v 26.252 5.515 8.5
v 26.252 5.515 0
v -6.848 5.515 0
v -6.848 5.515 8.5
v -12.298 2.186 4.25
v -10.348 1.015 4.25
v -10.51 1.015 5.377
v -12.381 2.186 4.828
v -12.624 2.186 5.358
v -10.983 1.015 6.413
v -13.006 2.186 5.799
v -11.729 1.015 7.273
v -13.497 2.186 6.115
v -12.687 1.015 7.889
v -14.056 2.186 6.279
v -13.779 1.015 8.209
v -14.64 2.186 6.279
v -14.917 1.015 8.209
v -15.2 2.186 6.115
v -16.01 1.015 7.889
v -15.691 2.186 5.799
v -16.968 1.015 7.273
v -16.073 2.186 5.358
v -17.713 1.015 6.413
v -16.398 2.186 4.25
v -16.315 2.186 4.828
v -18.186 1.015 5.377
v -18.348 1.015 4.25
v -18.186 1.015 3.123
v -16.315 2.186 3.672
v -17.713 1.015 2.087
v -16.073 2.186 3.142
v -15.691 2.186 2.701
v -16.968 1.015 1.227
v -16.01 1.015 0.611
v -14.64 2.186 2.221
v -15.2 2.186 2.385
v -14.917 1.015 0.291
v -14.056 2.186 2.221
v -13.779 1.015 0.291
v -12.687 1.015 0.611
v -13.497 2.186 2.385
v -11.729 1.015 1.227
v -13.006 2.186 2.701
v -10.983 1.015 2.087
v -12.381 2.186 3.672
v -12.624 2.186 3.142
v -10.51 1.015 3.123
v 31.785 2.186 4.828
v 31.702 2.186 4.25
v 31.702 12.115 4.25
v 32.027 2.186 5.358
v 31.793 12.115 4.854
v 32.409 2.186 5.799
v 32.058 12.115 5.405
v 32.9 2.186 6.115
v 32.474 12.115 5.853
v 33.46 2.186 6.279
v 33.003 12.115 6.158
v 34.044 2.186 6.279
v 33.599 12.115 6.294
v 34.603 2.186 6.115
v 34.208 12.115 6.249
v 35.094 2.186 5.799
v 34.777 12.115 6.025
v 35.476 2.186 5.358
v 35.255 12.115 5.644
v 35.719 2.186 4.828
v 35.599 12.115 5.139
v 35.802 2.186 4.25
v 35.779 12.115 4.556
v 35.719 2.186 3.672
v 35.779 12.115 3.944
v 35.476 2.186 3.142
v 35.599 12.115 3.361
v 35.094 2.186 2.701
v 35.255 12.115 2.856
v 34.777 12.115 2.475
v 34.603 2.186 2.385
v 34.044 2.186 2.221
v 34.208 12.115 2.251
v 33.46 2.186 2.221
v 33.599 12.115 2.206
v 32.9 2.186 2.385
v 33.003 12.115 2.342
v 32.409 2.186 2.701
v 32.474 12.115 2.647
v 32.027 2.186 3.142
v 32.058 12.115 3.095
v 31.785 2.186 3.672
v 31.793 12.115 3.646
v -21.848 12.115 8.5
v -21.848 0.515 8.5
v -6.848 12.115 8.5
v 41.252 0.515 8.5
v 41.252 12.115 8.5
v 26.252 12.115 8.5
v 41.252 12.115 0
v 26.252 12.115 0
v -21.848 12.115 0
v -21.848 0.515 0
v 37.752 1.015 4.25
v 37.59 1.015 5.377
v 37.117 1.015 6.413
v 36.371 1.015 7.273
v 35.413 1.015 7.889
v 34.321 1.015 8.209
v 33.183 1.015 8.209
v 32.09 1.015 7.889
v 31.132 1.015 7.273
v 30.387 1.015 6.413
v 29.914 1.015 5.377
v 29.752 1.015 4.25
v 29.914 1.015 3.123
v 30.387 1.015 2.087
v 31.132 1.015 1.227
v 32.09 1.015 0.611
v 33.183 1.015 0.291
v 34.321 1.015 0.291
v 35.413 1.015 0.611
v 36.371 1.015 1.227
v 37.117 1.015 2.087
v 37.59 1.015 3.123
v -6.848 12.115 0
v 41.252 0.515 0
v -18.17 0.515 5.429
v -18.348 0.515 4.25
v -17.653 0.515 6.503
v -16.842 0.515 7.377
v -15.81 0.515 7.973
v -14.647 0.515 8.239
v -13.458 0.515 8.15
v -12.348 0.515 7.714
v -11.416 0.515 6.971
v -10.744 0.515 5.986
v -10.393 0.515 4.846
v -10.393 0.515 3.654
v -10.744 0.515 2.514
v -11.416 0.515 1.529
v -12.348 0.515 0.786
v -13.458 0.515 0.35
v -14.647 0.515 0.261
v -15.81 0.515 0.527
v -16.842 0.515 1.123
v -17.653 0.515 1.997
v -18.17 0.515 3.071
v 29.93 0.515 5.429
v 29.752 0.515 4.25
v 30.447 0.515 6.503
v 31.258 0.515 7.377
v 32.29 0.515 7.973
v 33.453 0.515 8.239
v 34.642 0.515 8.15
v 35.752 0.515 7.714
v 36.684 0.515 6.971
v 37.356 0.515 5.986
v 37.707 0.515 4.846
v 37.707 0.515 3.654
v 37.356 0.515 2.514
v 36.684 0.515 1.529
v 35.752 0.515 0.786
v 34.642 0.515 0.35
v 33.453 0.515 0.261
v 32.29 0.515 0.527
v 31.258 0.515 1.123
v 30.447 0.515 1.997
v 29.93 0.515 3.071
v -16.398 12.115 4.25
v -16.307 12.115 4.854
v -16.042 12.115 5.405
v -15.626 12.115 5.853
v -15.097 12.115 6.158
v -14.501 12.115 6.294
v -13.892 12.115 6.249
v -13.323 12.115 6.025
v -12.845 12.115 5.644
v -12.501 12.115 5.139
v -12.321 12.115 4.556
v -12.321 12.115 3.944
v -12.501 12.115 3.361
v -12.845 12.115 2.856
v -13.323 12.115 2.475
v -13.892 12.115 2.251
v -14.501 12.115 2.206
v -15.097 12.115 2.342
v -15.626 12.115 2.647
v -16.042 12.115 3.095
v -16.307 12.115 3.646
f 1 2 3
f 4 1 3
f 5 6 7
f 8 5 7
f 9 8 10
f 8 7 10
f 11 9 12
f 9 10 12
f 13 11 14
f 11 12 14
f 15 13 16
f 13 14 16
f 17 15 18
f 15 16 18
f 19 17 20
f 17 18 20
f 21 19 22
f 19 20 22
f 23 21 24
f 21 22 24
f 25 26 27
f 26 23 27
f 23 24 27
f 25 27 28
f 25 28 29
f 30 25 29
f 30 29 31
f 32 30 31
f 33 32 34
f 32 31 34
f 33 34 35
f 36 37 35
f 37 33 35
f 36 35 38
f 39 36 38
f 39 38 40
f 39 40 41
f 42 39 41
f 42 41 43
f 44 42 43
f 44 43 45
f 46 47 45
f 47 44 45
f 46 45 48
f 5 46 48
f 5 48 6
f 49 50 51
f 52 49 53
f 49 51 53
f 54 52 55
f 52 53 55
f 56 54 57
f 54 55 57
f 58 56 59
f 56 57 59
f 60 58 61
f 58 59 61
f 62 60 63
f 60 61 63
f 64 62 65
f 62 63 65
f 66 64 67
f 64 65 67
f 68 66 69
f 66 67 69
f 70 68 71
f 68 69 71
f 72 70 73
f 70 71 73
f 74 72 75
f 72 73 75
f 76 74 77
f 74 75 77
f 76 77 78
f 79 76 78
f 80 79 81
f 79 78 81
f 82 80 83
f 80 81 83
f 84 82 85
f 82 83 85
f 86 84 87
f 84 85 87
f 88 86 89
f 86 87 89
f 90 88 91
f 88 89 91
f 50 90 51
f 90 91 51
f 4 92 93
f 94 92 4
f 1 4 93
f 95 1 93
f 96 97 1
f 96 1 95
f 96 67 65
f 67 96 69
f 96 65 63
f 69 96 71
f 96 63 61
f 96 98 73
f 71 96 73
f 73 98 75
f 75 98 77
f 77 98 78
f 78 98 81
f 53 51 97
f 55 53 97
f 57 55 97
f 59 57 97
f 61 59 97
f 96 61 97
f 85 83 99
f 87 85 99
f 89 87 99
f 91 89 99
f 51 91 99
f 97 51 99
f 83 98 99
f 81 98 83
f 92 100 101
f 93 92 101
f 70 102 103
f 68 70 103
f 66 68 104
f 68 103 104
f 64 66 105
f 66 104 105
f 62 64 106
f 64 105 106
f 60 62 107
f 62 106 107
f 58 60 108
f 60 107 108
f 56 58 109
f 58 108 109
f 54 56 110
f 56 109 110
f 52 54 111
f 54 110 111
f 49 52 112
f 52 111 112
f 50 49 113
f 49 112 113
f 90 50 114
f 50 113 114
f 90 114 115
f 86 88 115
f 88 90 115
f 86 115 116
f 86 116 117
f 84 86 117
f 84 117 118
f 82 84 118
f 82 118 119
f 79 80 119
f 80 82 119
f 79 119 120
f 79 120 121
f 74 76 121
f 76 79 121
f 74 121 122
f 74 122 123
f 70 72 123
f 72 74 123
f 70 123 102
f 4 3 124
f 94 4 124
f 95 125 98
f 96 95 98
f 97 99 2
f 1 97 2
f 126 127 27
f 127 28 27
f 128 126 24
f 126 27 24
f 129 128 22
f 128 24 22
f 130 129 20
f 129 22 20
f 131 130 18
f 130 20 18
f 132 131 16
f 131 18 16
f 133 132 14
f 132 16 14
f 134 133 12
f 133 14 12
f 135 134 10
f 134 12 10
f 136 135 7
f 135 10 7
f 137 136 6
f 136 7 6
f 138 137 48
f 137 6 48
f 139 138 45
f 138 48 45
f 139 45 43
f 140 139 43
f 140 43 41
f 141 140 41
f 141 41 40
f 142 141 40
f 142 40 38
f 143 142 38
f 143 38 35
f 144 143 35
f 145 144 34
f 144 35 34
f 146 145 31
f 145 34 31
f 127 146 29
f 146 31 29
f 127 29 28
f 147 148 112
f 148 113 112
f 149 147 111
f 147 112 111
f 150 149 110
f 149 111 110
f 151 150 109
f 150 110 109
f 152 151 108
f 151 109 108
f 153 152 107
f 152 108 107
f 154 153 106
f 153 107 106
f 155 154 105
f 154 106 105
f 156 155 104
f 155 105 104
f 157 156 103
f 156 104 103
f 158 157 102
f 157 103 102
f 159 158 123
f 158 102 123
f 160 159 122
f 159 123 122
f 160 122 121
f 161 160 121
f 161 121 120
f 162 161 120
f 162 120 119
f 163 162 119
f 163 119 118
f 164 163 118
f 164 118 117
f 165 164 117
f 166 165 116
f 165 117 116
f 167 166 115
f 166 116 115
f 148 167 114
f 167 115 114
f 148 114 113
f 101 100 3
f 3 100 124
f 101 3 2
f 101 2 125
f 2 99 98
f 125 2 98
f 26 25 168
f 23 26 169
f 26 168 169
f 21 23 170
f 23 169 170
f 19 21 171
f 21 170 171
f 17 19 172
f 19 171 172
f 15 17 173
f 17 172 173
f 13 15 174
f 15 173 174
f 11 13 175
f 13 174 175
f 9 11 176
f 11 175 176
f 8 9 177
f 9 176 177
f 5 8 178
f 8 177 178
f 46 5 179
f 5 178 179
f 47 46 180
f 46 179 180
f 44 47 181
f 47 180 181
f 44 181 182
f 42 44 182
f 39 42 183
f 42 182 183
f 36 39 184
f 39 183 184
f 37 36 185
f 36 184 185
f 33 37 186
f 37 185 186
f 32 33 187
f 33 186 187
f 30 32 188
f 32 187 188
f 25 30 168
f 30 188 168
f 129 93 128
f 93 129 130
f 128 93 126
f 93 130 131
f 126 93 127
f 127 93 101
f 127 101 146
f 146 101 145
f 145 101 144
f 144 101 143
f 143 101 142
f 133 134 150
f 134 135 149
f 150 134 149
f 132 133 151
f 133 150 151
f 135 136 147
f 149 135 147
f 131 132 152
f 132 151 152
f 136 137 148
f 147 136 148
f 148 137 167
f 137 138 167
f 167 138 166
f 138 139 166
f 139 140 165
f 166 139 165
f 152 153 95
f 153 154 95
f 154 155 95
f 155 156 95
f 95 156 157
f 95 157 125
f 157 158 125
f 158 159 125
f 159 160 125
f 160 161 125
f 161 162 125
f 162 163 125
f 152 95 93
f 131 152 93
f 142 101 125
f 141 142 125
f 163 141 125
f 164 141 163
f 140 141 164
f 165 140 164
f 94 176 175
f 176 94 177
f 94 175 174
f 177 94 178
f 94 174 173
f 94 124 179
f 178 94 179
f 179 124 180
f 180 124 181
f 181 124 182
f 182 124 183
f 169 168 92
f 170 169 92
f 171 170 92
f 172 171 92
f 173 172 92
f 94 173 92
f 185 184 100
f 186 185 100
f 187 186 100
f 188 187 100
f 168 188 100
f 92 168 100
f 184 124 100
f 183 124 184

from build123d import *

# Parameters (mm, degrees)
F1_DEPTH = 8.5
F3_D     = 4.1
F3_DEPTH = 12
F3_TIP   = 1.231764269
F4_D     = 8
F4_DEPTH = 0.5
F4_TIP   = 2.4034424761


with BuildPart() as f1:
    # F0 (on Top) → F1 (new body)
    with BuildSketch(Plane.XY):
        Polygon((-21.8481650084, 5.5145221063), (-21.8481650084, 0.5145221063), (41.2518349916, 0.5145221063), (41.2518349916, 5.5145221063), (41.2518349916, 12.1145221063), (26.2518349916, 12.1145221063), (26.2518349916, 5.5145221063), (-6.8481650084, 5.5145221063), (-6.8481650084, 12.1145221063), (-21.8481650084, 12.1145221063), align=None)
    extrude(amount=F1_DEPTH)

    # F3
    with Locations(Plane.XZ.offset(-0.5145221063)):
        with Locations((-14.3481650084, 4.25), (33.7518349916, 4.25)):
            Hole(F3_D / 2, depth=F3_DEPTH)
            with Locations((0, 0, -(F3_DEPTH + F3_TIP / 2))):  # 118° drill point
                Cone(0, F3_D / 2, F3_TIP, mode=Mode.SUBTRACT)

    # F4
    with Locations(Plane.XZ.offset(-0.5145221063)):
        with Locations((-14.3481650084, 4.25), (33.7518349916, 4.25)):
            Hole(F4_D / 2, depth=F4_DEPTH)
            with Locations((0, 0, -(F4_DEPTH + F4_TIP / 2))):  # 118° drill point
                Cone(0, F4_D / 2, F4_TIP, mode=Mode.SUBTRACT)


solid = f1.part
